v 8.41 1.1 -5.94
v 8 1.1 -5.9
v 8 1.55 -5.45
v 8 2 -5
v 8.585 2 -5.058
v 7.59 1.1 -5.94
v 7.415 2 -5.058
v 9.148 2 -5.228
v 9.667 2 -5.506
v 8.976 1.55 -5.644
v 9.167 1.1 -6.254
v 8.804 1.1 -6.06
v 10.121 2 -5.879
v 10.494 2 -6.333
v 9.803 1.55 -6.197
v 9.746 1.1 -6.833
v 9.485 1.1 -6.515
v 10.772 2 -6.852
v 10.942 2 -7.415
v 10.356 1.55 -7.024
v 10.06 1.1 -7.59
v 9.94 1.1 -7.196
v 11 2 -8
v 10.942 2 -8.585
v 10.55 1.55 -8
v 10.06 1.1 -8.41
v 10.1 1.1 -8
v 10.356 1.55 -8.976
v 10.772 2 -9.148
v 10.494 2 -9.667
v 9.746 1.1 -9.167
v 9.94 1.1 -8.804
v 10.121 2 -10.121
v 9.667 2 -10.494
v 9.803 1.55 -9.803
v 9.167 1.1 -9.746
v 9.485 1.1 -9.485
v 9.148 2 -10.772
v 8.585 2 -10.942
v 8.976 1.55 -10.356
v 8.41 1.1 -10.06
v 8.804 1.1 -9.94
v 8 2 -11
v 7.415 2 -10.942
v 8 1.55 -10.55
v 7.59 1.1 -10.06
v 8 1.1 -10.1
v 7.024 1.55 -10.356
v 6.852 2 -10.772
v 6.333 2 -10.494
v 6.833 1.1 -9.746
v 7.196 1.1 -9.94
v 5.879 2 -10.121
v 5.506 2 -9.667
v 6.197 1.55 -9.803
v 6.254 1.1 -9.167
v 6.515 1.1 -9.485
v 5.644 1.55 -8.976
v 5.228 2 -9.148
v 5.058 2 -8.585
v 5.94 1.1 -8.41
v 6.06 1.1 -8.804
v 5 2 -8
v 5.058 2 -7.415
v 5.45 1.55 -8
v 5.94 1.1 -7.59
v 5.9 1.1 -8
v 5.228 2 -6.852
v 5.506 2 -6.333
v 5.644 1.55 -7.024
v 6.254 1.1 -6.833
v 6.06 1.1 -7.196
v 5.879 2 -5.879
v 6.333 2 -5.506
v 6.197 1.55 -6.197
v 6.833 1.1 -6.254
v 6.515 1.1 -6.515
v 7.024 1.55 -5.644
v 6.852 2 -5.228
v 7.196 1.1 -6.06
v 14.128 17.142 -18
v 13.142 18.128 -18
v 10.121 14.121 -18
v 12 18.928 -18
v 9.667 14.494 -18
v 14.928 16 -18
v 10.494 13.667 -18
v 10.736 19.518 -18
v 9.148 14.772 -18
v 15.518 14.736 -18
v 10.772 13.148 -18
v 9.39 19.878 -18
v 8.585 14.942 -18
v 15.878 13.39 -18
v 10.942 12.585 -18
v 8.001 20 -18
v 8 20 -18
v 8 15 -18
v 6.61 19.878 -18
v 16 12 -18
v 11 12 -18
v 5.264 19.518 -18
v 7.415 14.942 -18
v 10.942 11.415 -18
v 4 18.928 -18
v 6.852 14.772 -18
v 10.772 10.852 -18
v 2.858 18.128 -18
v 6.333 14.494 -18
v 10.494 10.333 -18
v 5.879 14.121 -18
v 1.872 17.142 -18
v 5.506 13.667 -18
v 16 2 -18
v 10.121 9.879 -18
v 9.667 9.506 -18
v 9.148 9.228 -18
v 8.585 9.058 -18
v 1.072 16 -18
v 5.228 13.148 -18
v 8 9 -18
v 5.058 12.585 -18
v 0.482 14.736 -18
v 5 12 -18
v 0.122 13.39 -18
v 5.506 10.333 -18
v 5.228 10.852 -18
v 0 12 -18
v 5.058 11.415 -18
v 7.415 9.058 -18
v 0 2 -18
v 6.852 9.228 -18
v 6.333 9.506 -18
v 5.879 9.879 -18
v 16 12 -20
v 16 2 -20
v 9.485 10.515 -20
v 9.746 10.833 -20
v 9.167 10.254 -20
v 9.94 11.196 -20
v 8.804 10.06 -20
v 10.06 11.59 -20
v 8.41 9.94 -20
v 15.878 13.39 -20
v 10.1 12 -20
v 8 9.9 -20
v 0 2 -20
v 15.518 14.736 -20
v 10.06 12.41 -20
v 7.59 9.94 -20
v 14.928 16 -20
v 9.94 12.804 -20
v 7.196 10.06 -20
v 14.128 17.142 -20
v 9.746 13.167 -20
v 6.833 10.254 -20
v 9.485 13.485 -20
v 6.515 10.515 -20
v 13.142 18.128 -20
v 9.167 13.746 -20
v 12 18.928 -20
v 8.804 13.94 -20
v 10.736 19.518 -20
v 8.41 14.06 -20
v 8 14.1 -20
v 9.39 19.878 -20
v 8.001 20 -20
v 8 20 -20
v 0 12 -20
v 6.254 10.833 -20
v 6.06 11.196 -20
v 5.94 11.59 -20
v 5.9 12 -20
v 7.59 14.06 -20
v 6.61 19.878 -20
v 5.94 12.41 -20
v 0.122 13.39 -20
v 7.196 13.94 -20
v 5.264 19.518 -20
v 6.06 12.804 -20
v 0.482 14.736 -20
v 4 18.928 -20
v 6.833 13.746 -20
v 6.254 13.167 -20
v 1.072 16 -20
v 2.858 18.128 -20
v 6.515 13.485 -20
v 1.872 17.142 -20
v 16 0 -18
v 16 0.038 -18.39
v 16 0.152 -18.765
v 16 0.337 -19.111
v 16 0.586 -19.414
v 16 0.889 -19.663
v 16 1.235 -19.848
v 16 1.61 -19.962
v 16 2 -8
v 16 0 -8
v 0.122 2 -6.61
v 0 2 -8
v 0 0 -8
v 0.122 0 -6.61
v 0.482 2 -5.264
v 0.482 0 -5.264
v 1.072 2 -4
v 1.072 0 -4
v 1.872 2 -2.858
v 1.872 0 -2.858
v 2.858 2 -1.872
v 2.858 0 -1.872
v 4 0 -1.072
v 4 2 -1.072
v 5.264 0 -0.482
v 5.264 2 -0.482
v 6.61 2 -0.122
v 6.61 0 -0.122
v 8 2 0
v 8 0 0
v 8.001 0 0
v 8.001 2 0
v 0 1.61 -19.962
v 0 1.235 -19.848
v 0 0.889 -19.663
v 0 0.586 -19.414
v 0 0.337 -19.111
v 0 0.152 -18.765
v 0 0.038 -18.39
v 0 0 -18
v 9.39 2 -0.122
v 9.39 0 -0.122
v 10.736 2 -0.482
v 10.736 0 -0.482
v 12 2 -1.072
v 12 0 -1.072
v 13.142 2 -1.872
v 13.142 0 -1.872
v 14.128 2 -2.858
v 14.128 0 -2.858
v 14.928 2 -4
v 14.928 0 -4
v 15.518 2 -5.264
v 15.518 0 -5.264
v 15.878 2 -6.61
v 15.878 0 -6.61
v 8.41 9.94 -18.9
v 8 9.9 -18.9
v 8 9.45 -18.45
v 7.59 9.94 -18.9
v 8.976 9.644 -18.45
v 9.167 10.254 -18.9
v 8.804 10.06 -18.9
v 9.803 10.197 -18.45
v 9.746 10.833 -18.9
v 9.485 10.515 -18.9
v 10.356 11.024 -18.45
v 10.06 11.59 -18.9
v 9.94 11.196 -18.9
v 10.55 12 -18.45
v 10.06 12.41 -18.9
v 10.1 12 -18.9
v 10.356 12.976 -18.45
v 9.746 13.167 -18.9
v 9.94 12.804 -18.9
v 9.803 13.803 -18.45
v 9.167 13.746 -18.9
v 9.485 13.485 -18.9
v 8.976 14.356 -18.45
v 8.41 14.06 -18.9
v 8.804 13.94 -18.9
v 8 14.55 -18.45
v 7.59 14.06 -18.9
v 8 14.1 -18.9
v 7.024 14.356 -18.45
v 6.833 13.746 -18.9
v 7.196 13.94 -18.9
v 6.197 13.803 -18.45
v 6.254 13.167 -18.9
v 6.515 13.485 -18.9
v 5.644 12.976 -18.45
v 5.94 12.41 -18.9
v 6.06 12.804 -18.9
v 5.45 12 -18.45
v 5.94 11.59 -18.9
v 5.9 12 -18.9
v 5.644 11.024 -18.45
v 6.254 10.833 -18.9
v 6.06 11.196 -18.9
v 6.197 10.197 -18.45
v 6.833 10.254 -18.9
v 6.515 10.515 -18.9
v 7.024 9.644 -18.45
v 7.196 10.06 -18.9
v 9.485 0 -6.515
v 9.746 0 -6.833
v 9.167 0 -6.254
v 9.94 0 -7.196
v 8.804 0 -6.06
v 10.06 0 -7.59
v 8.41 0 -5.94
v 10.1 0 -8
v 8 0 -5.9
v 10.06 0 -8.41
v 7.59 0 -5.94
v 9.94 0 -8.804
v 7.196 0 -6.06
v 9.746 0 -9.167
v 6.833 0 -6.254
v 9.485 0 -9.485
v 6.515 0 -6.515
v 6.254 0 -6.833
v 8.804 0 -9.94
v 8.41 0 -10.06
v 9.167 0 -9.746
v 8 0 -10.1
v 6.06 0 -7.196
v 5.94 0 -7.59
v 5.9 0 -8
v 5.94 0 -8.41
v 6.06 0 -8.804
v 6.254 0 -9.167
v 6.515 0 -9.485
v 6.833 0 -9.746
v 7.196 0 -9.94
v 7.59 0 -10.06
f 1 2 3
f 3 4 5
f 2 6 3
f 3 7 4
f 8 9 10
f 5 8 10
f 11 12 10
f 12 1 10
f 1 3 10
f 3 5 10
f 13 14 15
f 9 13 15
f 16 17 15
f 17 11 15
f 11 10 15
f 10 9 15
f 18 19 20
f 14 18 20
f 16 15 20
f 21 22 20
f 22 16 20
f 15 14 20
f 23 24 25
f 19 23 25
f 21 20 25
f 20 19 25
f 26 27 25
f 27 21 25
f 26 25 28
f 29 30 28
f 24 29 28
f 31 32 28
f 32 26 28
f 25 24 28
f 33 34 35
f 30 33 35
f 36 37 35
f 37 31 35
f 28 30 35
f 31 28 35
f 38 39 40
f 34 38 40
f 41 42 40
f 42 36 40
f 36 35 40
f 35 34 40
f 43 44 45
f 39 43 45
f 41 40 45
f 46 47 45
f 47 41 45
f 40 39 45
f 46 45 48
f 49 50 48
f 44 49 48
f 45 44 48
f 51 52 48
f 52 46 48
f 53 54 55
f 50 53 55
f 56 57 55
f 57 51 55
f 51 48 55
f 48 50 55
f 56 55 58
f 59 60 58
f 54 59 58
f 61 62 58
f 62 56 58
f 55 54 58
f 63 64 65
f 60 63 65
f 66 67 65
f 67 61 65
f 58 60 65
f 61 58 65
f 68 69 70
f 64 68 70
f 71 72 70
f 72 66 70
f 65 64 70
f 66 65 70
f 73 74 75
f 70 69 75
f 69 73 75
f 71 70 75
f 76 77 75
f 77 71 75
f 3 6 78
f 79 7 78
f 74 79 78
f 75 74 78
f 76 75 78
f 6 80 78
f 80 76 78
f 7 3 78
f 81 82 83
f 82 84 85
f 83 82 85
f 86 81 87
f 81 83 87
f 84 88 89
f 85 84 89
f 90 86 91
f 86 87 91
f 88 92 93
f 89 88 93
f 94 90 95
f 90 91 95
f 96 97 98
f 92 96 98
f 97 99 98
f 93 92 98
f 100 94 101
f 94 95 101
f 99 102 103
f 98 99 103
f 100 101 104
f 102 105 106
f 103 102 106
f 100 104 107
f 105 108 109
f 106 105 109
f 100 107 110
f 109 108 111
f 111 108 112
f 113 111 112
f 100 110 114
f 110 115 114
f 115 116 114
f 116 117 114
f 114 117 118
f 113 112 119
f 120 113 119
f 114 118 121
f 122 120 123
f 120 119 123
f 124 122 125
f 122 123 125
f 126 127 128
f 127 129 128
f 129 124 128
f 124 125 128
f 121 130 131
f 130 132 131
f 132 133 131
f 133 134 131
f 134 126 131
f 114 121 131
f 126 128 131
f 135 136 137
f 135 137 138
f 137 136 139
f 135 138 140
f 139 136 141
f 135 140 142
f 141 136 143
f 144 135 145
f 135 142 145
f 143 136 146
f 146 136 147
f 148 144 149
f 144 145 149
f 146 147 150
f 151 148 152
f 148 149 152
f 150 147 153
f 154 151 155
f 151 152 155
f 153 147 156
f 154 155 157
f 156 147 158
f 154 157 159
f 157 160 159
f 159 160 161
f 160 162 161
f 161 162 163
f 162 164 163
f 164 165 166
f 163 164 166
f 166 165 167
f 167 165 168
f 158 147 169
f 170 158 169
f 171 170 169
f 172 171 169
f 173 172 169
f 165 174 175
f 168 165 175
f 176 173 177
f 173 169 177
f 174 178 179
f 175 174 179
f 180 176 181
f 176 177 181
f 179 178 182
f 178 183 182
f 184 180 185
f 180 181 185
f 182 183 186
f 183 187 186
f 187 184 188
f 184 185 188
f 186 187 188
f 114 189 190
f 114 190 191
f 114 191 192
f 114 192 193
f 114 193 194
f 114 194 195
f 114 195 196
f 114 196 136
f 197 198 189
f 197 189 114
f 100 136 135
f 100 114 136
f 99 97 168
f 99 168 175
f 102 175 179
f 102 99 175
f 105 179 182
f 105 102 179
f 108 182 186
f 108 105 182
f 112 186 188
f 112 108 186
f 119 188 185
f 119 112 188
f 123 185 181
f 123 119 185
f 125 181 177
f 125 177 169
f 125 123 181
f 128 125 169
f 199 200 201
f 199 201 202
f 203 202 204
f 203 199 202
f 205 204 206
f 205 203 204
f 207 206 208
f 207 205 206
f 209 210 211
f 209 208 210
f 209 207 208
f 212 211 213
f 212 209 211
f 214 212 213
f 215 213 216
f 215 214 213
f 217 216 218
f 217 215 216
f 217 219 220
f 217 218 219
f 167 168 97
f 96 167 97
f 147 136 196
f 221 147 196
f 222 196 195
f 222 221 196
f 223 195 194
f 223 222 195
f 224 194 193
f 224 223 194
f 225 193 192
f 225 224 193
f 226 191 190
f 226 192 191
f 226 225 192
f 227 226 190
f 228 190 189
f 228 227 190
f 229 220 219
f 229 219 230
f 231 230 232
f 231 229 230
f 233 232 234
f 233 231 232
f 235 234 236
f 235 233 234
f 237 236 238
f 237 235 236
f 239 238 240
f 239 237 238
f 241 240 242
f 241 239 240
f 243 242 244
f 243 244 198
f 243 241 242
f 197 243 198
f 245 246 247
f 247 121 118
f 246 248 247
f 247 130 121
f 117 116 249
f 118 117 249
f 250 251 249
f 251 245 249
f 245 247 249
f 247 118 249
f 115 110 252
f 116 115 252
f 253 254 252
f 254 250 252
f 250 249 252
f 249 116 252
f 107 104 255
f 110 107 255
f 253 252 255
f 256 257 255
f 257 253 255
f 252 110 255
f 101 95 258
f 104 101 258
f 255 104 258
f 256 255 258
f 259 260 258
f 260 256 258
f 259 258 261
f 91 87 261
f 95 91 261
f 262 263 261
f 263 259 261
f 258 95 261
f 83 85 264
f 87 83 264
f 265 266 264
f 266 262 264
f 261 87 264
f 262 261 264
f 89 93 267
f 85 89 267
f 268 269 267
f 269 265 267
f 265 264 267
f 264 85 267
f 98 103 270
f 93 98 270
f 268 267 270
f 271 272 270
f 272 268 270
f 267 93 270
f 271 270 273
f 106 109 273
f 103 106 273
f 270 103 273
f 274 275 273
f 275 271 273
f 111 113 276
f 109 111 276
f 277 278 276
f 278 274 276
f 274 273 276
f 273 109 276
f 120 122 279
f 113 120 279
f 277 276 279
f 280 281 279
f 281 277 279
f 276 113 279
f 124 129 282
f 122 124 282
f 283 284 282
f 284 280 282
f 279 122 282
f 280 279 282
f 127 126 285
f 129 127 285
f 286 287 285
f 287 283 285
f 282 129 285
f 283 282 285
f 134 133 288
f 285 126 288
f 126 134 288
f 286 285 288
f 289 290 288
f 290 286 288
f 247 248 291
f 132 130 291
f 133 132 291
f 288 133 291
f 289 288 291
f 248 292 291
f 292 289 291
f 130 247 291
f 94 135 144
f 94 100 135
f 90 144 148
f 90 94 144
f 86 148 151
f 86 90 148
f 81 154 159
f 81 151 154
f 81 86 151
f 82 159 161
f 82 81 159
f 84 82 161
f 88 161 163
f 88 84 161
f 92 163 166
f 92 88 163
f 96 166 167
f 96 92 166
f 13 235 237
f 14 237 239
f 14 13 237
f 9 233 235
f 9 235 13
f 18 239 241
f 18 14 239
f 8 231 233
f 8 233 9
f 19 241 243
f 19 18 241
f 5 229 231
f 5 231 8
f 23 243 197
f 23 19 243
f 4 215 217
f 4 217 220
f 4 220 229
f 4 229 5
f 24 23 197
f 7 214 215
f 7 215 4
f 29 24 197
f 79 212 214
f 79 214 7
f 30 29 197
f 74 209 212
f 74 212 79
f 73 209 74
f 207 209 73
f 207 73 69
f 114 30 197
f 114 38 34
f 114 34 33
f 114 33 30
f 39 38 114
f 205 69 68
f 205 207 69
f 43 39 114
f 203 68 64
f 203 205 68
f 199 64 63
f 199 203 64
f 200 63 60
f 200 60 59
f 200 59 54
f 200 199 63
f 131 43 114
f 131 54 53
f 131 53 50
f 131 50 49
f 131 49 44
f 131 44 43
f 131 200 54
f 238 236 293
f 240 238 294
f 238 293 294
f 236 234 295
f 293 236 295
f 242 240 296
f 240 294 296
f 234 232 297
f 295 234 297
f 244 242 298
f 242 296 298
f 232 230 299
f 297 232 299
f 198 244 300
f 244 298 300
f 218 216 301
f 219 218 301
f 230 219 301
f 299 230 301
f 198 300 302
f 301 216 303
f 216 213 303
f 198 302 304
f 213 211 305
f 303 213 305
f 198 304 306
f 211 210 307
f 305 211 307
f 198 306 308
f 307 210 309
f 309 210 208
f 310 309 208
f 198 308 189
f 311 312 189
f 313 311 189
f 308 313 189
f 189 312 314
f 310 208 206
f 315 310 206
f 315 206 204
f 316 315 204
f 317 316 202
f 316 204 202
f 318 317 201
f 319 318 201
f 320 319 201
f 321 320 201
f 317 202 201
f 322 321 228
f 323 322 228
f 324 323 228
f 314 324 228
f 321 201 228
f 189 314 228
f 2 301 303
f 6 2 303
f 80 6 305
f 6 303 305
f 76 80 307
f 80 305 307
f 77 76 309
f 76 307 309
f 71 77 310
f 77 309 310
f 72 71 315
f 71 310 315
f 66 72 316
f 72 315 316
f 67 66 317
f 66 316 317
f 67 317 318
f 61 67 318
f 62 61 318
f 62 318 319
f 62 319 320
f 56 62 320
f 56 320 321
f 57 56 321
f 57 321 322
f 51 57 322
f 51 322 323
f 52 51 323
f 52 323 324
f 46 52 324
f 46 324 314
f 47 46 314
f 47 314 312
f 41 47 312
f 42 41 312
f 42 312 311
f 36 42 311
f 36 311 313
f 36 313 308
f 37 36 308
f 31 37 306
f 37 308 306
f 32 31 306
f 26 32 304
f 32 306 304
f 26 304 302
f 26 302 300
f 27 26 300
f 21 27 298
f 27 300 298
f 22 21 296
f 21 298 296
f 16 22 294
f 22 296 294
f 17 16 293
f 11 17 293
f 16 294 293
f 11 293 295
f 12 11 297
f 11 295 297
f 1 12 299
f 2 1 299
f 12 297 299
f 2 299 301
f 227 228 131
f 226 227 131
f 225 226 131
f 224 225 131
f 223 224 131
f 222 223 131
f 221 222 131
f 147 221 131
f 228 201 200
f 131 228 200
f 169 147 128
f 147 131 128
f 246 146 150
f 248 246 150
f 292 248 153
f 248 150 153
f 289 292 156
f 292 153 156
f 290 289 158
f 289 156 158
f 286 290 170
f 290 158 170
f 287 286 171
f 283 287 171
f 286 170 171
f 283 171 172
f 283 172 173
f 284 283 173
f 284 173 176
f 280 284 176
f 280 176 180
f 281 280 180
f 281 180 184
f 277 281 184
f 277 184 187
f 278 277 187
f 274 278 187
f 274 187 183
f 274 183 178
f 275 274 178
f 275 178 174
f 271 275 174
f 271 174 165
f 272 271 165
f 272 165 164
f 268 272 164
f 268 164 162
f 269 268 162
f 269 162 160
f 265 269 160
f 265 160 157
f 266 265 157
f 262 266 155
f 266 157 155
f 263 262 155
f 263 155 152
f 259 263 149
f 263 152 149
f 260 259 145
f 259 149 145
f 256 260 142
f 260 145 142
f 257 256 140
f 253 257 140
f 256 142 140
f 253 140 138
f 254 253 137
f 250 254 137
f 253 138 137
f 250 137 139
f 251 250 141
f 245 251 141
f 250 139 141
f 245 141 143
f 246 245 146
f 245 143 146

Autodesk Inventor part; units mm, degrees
ref_plane "YZ Plane" through (0, 0, 0) normal (1, 0, 0) x (0, 1, 0)
ref_plane "XZ Plane" through (0, 0, 0) normal (0, 1, 0) x (-1, 0, 0)
ref_plane "XY Plane" through (0, 0, 0) normal (0, 0, 1) x (1, 0, 0)
sketch "Sketch1" plane through (0, 0, 0) normal (1, 0, 0) x (0, 1, 0)
  line L0 (0, 0) -> (2, 0)
  line L1 (0, 0) -> (0, -18)
  line L2 (2, -20) -> (20, -20)
  line L3 (20, -20) -> (20, -18)
  line L4 (20, -18) -> (2, -18)
  line L5 (2, 0) -> (2, -18)
  arc A0 (0, -18) -> (2, -20) centre (2, -18) ccw
  point P0 (0, -20)
  dimension "d0" = 2
  dimension "d1" = 20
  dimension "d2" = 20
  dimension "d3" = 2
  dimension "d4" = 2
extrude "Extrusion1" add sketch "Sketch1" along normal blind 16
fillet "Fillet2" radius 8 4 edges at (16, 20, -19) (0, 20, -19) (0, 1, 0) (16, 1, 0)
sketch "Sketch2" plane through (0, 2, -18) normal (0, 0, 1) x (1, 0, 0)
  line L0 (0, 0) -> (0, 10) projected
  line L1 (0, 0) -> (16, 0) projected
  line L2 (16, 10) -> (16, 0) projected
  arc A0 (16, 10) -> (0, 10) centre (8, 10) ccw projected
  line L3 (0, 0) -> (16, 0) projected
  point P0 (0, -2)
hole "Hole1" at (8, 12, -18) direction (0, 0, -1) diameter 4.2 end through all countersink diameter 6 countersink angle 90
sketch "Sketch4" plane through (0, 2, -18) normal (0, 1, 0) x (1, 0, 0)
  arc A0 (0, -10) -> (16, -10) centre (8, -10) ccw projected
  line L0 (16, 0) -> (16, -10) projected
  line L1 (0, 0) -> (16, 0) projected
  line L2 (0, -10) -> (0, 0) projected
  point P0 (0, -18)
hole "Hole3" at (8, 2, -8) direction (0, -1, 0) diameter 4.2 end through all countersink diameter 6 countersink angle 90
properties part number "MellewellCornerBrace"
